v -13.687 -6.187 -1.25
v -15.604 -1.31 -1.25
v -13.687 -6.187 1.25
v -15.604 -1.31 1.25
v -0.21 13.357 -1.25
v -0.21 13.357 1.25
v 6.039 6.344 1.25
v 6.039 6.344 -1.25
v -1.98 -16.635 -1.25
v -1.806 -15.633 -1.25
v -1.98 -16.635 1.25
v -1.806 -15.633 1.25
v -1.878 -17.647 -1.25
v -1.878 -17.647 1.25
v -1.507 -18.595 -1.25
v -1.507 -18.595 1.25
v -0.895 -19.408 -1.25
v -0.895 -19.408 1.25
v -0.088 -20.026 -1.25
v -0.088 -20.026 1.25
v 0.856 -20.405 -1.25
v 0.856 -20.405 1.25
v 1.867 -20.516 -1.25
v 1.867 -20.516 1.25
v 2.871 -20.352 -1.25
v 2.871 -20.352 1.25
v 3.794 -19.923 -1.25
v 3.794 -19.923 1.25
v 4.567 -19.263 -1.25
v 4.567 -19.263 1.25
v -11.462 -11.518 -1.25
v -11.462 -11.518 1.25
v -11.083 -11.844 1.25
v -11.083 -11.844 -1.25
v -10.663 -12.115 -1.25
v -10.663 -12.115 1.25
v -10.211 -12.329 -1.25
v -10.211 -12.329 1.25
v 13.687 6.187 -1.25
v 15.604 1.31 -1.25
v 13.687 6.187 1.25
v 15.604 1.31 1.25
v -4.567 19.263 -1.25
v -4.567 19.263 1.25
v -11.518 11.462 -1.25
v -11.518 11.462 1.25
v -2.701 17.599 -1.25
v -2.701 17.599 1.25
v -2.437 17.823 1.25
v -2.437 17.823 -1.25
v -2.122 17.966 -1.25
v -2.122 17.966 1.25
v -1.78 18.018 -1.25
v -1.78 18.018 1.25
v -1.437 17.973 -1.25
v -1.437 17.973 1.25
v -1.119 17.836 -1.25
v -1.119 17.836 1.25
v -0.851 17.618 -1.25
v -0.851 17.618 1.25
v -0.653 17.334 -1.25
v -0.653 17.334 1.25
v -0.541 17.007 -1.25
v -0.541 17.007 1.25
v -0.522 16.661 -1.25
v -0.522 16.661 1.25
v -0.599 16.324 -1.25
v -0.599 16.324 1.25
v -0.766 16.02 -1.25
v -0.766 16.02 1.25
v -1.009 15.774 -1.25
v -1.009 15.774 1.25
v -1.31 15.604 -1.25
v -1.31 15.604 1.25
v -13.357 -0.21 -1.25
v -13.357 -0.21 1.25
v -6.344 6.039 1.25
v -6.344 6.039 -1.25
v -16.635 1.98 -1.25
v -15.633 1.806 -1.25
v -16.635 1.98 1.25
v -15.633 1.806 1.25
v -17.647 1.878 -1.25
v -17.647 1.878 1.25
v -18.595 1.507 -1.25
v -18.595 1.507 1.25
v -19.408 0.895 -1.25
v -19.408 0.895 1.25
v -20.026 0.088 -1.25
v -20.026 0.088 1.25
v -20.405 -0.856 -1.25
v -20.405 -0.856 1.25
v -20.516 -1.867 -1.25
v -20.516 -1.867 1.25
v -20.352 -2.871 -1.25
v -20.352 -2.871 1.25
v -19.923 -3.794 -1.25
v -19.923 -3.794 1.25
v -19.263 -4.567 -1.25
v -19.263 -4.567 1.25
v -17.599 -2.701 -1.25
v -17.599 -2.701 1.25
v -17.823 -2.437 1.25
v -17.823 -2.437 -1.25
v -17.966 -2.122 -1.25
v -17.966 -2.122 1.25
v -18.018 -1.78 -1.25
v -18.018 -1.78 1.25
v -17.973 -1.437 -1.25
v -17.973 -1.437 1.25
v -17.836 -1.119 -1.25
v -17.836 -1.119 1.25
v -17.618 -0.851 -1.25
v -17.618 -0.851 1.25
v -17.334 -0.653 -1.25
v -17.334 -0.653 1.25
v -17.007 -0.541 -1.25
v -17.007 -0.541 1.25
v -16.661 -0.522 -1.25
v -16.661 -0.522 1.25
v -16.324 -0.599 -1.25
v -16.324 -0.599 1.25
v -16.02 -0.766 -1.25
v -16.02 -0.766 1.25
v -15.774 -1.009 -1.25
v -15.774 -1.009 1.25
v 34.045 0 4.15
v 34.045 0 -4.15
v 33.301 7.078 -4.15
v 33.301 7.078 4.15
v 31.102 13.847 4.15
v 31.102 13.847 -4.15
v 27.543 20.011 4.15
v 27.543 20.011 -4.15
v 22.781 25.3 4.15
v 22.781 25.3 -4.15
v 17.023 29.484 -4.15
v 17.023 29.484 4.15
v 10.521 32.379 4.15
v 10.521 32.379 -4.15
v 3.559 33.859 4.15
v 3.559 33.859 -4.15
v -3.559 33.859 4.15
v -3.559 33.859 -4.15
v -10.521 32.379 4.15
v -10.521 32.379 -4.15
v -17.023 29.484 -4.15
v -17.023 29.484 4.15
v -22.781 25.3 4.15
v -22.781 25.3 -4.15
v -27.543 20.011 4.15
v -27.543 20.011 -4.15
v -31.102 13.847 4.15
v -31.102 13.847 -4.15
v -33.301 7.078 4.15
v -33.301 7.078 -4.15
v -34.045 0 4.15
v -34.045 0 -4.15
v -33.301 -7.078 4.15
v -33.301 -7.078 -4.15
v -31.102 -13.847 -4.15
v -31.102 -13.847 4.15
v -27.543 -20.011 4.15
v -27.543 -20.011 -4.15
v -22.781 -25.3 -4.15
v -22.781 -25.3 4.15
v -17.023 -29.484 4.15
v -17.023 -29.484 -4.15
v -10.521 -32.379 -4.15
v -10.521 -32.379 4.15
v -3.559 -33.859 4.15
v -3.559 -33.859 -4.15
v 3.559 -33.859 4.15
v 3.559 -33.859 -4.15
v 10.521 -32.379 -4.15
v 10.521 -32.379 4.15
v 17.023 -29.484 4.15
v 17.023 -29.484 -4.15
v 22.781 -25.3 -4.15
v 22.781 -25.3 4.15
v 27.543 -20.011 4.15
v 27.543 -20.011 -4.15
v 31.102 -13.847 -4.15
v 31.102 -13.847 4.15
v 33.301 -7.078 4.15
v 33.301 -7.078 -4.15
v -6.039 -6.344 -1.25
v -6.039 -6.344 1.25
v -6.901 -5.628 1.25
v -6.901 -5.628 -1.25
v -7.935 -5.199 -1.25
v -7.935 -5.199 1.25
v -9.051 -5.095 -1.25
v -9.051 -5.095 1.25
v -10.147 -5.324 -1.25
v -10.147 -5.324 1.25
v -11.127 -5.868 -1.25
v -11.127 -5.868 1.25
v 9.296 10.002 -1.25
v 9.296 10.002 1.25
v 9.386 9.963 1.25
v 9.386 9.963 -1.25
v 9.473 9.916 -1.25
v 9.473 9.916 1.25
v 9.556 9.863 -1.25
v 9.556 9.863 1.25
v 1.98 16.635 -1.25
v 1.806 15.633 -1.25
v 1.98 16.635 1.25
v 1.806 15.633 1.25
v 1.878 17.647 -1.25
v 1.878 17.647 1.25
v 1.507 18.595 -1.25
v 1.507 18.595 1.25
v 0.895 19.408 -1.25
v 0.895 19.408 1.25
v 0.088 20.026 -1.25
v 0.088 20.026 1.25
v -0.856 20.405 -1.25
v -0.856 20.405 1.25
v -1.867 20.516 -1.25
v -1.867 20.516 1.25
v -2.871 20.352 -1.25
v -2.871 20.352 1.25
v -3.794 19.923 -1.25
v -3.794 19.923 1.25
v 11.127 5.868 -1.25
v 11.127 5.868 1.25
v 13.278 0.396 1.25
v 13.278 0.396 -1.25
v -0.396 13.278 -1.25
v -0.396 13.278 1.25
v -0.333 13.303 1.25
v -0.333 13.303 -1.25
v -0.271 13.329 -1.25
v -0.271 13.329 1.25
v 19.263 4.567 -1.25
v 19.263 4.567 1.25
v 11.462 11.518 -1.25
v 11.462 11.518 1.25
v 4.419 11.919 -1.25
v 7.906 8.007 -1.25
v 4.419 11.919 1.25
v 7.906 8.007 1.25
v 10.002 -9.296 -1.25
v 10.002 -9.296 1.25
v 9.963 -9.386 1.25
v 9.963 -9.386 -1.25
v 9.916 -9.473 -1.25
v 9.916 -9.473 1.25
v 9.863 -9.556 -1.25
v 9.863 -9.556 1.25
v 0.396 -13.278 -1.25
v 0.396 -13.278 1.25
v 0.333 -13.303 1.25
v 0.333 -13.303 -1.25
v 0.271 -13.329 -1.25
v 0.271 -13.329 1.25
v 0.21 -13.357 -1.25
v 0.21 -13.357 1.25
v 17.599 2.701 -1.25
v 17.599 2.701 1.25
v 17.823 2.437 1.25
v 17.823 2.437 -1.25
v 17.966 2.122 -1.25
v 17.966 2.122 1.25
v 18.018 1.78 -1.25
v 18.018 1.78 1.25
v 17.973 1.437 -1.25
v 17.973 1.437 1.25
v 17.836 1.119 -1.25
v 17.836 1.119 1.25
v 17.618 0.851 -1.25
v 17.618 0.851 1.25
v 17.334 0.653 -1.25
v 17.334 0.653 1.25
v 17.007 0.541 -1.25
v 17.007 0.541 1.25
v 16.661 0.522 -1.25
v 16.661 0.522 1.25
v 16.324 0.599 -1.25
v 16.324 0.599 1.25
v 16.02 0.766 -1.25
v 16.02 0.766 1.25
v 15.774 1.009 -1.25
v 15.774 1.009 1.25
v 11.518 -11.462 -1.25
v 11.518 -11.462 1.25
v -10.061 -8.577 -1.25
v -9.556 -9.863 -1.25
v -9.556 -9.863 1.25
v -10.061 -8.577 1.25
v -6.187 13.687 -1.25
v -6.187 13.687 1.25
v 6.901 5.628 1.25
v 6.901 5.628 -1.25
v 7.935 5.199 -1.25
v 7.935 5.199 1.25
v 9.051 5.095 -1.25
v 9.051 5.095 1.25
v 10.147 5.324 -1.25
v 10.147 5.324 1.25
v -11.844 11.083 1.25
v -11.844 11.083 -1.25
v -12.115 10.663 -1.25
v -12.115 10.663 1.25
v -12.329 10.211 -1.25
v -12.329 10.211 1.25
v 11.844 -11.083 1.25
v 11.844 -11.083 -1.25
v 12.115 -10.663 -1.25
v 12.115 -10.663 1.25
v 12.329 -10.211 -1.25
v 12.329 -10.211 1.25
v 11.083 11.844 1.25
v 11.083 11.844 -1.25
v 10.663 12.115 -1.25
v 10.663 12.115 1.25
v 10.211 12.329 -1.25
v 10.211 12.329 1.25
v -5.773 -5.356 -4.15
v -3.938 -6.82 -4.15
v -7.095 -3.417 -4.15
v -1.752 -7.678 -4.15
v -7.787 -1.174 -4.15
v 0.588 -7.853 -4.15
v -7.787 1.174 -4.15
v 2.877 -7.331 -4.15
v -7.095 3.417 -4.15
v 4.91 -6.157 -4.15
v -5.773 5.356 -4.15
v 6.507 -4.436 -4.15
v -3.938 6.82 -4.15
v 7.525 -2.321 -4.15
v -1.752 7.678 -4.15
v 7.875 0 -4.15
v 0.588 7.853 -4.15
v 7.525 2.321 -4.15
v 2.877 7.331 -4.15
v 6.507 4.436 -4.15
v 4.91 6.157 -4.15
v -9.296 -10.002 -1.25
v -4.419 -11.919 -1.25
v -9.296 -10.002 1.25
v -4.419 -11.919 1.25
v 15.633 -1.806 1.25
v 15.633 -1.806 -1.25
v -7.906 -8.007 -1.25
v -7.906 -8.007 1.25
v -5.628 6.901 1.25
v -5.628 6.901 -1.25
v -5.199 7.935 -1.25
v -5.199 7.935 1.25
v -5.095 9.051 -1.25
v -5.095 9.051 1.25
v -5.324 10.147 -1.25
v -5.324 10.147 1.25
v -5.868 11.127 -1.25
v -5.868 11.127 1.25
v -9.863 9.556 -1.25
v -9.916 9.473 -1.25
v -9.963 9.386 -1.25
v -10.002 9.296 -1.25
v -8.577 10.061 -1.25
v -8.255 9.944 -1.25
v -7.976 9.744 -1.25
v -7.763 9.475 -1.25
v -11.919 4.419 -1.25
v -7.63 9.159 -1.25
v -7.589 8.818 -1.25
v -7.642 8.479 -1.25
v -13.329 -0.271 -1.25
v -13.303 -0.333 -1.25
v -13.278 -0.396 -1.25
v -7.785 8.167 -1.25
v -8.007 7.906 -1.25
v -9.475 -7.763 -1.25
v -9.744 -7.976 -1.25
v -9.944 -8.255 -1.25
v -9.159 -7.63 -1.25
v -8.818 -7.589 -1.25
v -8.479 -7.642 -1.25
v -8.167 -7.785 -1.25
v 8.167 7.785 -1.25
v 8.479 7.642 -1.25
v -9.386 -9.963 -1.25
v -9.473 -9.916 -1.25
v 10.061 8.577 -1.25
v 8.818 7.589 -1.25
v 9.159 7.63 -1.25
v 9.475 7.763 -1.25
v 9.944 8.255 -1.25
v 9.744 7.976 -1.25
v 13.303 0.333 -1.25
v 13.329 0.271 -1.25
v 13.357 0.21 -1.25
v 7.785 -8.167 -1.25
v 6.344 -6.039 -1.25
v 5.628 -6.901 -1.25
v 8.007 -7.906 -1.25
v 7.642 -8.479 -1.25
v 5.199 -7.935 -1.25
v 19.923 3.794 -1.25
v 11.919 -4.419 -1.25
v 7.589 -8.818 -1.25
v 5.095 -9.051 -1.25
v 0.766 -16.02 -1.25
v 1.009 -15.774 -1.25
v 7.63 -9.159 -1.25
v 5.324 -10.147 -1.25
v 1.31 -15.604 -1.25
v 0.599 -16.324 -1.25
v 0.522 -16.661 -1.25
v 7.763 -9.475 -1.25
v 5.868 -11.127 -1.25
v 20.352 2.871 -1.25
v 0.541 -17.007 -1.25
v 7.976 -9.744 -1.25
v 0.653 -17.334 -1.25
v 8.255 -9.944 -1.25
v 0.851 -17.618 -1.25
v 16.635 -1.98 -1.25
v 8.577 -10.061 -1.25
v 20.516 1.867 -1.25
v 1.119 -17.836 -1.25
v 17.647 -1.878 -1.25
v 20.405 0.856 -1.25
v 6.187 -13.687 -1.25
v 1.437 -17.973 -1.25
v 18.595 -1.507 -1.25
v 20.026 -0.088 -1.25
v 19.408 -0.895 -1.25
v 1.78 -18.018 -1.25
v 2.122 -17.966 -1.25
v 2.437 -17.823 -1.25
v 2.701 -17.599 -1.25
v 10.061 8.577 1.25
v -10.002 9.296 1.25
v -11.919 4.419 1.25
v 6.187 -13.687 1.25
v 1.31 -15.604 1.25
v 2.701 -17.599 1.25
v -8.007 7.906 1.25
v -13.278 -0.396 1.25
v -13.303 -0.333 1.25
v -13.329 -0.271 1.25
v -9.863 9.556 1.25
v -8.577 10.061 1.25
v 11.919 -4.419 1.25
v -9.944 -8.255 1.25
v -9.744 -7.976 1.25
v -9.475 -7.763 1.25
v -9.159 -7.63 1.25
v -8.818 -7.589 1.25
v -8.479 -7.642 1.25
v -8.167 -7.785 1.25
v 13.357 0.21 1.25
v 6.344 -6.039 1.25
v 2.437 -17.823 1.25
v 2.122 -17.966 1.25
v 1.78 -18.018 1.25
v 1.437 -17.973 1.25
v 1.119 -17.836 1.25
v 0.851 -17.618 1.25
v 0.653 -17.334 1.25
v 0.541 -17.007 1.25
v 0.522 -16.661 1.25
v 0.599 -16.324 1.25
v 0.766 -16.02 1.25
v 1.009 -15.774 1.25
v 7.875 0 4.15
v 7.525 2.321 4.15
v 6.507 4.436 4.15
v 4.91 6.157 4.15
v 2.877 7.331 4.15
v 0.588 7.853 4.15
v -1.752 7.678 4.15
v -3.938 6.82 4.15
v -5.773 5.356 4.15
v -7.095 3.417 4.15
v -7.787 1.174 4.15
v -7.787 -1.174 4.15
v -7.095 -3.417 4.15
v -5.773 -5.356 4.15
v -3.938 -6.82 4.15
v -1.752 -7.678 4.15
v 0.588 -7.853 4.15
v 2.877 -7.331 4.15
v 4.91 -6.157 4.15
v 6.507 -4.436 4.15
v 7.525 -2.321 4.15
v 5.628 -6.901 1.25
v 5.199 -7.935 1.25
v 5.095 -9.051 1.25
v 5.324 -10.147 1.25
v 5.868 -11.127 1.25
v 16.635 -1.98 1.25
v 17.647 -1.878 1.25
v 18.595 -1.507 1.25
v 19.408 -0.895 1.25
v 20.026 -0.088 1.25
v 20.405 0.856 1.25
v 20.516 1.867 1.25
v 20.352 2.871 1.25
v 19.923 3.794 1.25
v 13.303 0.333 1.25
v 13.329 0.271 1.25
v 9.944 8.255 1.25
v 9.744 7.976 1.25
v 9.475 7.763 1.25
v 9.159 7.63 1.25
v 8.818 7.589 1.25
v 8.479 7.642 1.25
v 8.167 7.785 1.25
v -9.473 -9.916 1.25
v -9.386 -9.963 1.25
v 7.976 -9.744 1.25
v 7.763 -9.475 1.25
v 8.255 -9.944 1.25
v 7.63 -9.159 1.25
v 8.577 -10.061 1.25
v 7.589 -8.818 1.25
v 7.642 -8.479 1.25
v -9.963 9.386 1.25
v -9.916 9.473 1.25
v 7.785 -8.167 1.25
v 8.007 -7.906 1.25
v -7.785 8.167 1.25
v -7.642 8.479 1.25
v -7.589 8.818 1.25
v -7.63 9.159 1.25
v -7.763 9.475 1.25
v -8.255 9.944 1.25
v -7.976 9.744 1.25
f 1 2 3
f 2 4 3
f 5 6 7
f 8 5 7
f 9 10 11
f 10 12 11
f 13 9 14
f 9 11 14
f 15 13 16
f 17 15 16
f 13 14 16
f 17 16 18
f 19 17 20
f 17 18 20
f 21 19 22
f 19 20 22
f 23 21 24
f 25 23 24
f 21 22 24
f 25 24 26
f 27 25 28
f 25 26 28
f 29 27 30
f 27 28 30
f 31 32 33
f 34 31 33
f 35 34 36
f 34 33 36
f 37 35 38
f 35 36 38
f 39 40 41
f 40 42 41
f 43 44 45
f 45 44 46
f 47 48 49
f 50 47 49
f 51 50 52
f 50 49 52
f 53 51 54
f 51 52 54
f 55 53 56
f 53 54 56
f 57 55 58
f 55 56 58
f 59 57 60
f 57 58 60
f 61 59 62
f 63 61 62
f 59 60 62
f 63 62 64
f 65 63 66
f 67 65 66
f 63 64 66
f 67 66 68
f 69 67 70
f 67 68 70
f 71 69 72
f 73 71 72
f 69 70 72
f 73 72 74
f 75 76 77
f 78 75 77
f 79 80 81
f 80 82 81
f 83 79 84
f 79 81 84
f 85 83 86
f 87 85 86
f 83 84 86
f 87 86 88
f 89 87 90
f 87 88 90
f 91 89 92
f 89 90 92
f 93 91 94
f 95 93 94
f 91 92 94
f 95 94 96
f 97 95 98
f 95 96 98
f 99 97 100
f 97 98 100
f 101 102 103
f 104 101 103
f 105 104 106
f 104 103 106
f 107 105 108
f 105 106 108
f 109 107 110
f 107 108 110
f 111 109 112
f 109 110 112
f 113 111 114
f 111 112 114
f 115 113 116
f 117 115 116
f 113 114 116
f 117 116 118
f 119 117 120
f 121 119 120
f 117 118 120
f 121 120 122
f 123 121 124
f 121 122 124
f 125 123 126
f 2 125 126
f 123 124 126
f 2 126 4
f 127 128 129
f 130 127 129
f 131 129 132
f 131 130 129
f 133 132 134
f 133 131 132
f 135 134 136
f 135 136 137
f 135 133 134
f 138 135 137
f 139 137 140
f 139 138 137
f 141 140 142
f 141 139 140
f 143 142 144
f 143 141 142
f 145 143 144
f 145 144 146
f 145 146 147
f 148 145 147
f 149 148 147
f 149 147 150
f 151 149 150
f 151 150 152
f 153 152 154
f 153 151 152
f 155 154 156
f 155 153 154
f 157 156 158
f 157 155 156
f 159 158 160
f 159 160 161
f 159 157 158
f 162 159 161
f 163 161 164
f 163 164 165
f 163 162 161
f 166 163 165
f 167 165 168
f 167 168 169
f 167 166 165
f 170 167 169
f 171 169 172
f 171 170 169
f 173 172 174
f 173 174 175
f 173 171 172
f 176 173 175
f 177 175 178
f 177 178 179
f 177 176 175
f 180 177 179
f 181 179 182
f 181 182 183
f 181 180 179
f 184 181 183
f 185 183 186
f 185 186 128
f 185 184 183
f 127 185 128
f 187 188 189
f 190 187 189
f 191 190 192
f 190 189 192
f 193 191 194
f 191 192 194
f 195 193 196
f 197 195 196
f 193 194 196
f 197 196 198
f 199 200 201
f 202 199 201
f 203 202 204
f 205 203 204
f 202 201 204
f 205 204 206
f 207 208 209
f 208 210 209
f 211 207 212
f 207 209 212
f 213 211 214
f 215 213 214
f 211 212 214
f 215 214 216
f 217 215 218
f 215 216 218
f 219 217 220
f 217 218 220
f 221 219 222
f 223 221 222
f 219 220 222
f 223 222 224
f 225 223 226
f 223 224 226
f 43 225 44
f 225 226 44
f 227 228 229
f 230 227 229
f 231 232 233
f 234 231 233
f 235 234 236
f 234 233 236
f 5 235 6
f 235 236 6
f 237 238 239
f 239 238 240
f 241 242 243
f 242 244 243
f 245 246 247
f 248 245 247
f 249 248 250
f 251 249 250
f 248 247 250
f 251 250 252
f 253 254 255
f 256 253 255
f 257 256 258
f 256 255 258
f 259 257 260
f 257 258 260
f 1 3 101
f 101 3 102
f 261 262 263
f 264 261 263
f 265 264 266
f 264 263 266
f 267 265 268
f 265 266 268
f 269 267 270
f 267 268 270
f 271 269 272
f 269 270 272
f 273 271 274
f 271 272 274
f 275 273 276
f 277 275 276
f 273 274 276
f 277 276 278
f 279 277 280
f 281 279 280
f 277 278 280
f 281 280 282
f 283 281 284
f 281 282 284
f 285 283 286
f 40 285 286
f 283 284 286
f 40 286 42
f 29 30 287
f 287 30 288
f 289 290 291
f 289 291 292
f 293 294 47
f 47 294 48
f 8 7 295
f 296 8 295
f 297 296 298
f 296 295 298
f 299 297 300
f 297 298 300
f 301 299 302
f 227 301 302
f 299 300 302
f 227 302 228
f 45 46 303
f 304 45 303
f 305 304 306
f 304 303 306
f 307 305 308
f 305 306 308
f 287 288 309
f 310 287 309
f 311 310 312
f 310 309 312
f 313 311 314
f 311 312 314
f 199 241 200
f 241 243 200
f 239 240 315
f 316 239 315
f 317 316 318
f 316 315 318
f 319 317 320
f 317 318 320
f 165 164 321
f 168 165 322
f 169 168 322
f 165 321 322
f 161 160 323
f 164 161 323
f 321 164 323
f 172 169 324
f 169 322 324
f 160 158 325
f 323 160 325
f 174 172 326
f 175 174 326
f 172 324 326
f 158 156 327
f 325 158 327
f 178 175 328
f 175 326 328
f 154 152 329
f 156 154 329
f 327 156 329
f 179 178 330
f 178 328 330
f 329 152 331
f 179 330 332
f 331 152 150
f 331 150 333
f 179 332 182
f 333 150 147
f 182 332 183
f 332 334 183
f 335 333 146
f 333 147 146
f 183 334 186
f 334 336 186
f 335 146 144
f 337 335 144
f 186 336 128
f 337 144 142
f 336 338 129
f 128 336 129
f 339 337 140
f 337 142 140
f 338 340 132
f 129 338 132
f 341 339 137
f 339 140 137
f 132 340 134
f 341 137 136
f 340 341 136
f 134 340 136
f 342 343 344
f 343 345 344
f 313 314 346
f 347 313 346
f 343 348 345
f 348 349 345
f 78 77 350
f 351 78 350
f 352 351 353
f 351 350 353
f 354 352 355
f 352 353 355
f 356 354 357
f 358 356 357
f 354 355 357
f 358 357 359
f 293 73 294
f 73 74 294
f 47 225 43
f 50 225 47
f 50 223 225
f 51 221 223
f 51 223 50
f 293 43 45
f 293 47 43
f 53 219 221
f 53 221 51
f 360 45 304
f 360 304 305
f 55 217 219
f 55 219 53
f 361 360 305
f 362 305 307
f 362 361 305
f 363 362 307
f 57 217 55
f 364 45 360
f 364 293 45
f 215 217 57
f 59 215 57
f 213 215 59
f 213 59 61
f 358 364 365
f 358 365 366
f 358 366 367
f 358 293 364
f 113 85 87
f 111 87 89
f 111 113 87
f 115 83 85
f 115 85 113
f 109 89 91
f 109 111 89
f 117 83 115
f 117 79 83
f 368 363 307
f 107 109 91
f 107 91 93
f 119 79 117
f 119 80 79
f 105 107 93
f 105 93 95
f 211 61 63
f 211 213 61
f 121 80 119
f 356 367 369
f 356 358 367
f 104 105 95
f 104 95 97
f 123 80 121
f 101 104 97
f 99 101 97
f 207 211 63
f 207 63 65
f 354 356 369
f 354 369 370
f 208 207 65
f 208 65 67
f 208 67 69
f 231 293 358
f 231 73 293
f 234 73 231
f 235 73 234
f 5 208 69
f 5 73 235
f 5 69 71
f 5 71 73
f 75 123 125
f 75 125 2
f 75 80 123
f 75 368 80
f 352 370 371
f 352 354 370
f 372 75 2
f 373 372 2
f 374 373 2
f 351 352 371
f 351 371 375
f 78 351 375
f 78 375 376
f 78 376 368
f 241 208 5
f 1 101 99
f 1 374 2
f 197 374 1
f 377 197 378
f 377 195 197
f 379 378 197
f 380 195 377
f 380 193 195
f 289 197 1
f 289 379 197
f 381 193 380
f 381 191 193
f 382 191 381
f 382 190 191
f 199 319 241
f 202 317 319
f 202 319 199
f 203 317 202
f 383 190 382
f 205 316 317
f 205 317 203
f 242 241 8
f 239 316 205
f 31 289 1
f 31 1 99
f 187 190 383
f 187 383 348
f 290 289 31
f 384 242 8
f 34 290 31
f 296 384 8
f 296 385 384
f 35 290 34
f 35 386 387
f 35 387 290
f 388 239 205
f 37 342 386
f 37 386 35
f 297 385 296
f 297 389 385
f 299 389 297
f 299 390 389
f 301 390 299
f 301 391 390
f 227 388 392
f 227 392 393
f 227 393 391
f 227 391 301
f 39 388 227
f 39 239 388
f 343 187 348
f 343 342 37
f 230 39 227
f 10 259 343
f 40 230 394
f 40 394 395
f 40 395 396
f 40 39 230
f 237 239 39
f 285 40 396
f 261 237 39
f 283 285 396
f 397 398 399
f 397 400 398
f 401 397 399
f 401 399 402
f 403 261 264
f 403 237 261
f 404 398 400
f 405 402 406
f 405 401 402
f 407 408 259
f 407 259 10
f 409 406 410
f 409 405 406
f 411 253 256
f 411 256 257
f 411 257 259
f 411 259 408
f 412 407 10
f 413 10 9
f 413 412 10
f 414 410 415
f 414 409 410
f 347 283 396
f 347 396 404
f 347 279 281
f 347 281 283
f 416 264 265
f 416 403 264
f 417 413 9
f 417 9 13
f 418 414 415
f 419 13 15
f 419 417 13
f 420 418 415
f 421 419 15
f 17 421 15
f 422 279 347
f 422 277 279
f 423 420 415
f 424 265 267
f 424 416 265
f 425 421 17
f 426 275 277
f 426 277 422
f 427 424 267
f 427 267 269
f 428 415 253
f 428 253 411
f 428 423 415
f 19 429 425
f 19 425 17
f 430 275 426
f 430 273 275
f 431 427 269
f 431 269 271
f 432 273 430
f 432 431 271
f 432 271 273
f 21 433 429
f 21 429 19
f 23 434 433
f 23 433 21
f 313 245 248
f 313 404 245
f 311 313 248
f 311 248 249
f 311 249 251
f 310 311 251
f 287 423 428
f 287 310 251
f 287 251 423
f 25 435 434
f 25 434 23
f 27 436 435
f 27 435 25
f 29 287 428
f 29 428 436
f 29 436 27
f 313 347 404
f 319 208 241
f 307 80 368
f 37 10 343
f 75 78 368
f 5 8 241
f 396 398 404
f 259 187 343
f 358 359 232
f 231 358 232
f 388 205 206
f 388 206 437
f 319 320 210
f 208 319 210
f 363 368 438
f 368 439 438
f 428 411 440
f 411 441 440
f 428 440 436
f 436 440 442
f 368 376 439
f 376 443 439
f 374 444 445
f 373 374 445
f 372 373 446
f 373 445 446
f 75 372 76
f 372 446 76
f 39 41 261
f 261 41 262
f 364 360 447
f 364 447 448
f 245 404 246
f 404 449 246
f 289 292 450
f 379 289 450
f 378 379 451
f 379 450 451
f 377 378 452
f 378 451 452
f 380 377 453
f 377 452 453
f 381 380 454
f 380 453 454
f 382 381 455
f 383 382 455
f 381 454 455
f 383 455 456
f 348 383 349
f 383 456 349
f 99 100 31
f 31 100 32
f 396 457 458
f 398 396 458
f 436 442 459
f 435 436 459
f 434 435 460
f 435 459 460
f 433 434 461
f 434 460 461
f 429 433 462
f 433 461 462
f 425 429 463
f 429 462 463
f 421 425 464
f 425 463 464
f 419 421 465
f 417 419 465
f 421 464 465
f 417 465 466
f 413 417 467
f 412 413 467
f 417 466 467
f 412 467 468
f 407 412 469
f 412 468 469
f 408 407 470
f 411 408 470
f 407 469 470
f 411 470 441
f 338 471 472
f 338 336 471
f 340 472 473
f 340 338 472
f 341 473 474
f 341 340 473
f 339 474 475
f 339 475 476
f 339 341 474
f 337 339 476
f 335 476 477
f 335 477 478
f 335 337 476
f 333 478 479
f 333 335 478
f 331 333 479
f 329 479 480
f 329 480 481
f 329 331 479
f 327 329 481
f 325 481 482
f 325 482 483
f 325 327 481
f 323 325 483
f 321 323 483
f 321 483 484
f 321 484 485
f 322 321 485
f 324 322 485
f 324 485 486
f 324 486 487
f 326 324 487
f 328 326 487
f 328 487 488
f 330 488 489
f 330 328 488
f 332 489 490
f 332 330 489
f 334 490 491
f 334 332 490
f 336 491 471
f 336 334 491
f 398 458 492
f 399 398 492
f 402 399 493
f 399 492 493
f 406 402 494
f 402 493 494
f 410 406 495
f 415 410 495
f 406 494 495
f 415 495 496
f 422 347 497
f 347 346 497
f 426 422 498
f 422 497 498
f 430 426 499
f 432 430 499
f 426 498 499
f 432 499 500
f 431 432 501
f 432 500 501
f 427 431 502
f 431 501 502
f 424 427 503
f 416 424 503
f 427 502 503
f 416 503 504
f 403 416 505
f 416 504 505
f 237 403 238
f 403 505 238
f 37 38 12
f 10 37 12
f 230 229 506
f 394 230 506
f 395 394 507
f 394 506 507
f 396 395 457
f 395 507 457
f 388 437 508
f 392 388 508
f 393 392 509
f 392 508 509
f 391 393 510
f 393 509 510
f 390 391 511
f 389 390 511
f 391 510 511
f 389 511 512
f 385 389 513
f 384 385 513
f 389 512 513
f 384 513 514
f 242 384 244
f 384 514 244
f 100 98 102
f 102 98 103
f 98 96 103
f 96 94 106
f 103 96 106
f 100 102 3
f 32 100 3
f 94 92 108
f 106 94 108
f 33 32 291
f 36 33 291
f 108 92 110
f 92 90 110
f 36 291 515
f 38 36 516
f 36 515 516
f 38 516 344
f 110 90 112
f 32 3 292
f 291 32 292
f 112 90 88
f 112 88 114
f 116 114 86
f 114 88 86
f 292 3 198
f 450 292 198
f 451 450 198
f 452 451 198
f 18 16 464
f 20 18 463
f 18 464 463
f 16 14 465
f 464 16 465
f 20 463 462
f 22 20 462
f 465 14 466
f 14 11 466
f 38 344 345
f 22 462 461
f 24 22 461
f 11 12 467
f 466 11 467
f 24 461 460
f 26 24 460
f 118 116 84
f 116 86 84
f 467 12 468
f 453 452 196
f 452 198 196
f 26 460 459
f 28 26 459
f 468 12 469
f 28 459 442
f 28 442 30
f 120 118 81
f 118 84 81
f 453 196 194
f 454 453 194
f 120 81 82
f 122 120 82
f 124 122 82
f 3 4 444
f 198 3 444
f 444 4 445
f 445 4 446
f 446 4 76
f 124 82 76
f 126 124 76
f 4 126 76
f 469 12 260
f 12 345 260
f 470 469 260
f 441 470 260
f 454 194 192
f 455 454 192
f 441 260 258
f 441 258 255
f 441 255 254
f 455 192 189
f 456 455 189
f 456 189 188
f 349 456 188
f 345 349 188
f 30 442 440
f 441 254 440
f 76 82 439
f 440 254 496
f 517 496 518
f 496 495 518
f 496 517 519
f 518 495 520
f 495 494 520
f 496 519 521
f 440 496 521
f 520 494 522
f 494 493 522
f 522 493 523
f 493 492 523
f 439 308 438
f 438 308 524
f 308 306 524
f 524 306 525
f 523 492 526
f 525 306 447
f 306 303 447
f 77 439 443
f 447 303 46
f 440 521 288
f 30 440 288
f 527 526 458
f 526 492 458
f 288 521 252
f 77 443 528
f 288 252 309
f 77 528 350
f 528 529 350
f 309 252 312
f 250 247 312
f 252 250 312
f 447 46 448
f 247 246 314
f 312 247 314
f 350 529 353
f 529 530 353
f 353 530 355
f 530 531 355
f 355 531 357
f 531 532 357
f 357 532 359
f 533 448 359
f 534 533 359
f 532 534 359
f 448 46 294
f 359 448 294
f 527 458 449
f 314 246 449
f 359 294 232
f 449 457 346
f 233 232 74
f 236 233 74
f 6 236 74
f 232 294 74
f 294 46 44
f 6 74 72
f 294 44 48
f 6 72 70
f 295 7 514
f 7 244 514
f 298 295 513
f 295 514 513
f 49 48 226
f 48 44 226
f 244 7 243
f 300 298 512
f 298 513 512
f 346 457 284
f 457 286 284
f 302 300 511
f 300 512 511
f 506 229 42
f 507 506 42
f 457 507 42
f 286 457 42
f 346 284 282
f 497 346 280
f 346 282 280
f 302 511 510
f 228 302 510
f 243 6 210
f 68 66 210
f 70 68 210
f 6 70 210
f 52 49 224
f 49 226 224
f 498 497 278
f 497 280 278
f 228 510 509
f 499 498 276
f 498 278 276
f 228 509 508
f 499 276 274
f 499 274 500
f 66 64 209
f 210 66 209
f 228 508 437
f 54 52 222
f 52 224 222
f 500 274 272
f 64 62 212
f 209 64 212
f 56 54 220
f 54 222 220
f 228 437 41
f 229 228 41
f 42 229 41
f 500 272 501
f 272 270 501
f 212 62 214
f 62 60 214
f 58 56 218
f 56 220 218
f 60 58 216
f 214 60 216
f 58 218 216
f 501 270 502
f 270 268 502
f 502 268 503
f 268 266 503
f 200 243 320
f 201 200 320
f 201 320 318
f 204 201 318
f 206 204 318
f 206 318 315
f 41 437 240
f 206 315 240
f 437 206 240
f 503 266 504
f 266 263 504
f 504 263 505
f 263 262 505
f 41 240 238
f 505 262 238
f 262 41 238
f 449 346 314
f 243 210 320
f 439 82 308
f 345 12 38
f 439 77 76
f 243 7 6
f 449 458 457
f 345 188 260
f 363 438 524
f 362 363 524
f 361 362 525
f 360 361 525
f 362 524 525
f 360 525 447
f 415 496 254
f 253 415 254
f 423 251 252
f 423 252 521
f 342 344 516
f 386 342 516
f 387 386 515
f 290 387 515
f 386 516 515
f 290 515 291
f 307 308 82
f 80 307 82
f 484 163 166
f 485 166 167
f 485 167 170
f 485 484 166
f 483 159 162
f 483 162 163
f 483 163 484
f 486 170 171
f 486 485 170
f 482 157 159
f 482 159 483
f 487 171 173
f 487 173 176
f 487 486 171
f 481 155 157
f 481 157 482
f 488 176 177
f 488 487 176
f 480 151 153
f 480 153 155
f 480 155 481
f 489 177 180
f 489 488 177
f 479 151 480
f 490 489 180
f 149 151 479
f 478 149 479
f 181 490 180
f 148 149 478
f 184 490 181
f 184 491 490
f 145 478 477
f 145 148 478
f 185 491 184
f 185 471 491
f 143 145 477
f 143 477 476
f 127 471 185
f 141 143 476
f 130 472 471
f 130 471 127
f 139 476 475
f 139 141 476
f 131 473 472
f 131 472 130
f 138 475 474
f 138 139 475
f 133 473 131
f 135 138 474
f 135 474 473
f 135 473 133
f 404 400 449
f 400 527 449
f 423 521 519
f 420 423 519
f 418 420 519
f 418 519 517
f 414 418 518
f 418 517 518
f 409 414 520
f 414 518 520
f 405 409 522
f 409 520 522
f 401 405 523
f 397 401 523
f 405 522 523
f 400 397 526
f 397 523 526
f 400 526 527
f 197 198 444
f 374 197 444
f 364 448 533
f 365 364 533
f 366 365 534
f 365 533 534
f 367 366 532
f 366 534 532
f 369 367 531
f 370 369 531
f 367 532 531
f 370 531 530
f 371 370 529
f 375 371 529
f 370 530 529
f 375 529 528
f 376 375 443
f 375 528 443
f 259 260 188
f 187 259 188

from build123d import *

# Parameters (mm, degrees)
F0_R            = 34.0451530949
F0_R_2          = 1.25
F0_R_3          = 7.875
F1_DEPTH        = 4.15
F3_DEPTH        = 1.25
F3_COPIES_COUNT = 4


# Not quite as in the source:
# - a pattern or mirror of a feature is missing from the dataset's text; its kind, count and spacing are read off the source's solid


with BuildPart() as f1:
    # F0 (on Top) → F1 (new body, symmetric)
    with BuildSketch(Plane.XY):
        Circle(F0_R)
        with Locations((10.6066017178, -10.6066017178)):
            Circle(F0_R_2, mode=Mode.SUBTRACT)
        Circle(F0_R_3, mode=Mode.SUBTRACT)
        with Locations((15, 0)):
            Circle(F0_R_2, mode=Mode.SUBTRACT)
        with Locations((10.6066017178, 10.6066017178)):
            Circle(F0_R_2, mode=Mode.SUBTRACT)
        with Locations((10.6066017178, 10.6066017178)):
            Circle(F0_R_2)
        with Locations((15, 0)):
            Circle(F0_R_2)
        with Locations((10.6066017178, -10.6066017178)):
            Circle(F0_R_2)
    extrude(amount=F1_DEPTH, both=True)

    # F2 (on Top) → F3 (cut, symmetric)
    with BuildSketch(Plane.XY):
        with BuildLine():
            Line((9.4432745967, 10.1492506389), (13.2777855897, 0.3957137164))
            ThreePointArc((13.2777855897, 0.3957137164), (13.3159783656, 0.3022787926), (13.3566720831, 0.2099056662))
            Line((13.3566720831, 0.2099056662), (6.3440025672, -6.039136155))
            ThreePointArc((6.3440025672, -6.039136155), (6.6944330225, -11.915202943), (12.3288161281, -10.2108880014))
            Line((12.3288161281, -10.2108880014), (15.6329589882, -1.8064058021))
            ThreePointArc((15.6329589882, -1.8064058021), (20.0264439119, -0.0879066383), (19.2625991506, 4.5674655628))
            Line((19.2625991506, 4.5674655628), (11.4382124503, 11.5398345877))
            ThreePointArc((11.4382124503, 11.5398345877), (9.891801137, 11.6320577772), (9.4432745967, 10.1492506389))
        make_face()
        with BuildLine():
            ThreePointArc((10.0021618859, -9.2961858437), (8.1240341841, -9.8642908242), (8.0072240323, -7.9056018949))
            Line((8.0072240323, -7.9056018949), (11.9194173824, -4.4194173824))
            Line((11.9194173824, -4.4194173824), (10.0021618859, -9.2961858437))
        make_face(mode=Mode.SUBTRACT)
        with BuildLine():
            ThreePointArc((17.5993776855, 2.7009998229), (17.4825675337, 0.7423108936), (15.6044398319, 1.3104158741))
            Line((15.6044398319, 1.3104158741), (13.6871843354, 6.1871843354))
            Line((13.6871843354, 6.1871843354), (17.5993776855, 2.7009998229))
        make_face(mode=Mode.SUBTRACT)
    f3 = extrude(amount=F3_DEPTH, both=True, mode=Mode.SUBTRACT)

    # F3_copies: F3 ×4 about axis
    f3_copies_axis = Axis((0, 0, 0), (0, 0, 1))
    for i in range(1, F3_COPIES_COUNT):
        add(f3.rotate(f3_copies_axis, i * 360 / F3_COPIES_COUNT), mode=Mode.SUBTRACT)


solid = f1.part
